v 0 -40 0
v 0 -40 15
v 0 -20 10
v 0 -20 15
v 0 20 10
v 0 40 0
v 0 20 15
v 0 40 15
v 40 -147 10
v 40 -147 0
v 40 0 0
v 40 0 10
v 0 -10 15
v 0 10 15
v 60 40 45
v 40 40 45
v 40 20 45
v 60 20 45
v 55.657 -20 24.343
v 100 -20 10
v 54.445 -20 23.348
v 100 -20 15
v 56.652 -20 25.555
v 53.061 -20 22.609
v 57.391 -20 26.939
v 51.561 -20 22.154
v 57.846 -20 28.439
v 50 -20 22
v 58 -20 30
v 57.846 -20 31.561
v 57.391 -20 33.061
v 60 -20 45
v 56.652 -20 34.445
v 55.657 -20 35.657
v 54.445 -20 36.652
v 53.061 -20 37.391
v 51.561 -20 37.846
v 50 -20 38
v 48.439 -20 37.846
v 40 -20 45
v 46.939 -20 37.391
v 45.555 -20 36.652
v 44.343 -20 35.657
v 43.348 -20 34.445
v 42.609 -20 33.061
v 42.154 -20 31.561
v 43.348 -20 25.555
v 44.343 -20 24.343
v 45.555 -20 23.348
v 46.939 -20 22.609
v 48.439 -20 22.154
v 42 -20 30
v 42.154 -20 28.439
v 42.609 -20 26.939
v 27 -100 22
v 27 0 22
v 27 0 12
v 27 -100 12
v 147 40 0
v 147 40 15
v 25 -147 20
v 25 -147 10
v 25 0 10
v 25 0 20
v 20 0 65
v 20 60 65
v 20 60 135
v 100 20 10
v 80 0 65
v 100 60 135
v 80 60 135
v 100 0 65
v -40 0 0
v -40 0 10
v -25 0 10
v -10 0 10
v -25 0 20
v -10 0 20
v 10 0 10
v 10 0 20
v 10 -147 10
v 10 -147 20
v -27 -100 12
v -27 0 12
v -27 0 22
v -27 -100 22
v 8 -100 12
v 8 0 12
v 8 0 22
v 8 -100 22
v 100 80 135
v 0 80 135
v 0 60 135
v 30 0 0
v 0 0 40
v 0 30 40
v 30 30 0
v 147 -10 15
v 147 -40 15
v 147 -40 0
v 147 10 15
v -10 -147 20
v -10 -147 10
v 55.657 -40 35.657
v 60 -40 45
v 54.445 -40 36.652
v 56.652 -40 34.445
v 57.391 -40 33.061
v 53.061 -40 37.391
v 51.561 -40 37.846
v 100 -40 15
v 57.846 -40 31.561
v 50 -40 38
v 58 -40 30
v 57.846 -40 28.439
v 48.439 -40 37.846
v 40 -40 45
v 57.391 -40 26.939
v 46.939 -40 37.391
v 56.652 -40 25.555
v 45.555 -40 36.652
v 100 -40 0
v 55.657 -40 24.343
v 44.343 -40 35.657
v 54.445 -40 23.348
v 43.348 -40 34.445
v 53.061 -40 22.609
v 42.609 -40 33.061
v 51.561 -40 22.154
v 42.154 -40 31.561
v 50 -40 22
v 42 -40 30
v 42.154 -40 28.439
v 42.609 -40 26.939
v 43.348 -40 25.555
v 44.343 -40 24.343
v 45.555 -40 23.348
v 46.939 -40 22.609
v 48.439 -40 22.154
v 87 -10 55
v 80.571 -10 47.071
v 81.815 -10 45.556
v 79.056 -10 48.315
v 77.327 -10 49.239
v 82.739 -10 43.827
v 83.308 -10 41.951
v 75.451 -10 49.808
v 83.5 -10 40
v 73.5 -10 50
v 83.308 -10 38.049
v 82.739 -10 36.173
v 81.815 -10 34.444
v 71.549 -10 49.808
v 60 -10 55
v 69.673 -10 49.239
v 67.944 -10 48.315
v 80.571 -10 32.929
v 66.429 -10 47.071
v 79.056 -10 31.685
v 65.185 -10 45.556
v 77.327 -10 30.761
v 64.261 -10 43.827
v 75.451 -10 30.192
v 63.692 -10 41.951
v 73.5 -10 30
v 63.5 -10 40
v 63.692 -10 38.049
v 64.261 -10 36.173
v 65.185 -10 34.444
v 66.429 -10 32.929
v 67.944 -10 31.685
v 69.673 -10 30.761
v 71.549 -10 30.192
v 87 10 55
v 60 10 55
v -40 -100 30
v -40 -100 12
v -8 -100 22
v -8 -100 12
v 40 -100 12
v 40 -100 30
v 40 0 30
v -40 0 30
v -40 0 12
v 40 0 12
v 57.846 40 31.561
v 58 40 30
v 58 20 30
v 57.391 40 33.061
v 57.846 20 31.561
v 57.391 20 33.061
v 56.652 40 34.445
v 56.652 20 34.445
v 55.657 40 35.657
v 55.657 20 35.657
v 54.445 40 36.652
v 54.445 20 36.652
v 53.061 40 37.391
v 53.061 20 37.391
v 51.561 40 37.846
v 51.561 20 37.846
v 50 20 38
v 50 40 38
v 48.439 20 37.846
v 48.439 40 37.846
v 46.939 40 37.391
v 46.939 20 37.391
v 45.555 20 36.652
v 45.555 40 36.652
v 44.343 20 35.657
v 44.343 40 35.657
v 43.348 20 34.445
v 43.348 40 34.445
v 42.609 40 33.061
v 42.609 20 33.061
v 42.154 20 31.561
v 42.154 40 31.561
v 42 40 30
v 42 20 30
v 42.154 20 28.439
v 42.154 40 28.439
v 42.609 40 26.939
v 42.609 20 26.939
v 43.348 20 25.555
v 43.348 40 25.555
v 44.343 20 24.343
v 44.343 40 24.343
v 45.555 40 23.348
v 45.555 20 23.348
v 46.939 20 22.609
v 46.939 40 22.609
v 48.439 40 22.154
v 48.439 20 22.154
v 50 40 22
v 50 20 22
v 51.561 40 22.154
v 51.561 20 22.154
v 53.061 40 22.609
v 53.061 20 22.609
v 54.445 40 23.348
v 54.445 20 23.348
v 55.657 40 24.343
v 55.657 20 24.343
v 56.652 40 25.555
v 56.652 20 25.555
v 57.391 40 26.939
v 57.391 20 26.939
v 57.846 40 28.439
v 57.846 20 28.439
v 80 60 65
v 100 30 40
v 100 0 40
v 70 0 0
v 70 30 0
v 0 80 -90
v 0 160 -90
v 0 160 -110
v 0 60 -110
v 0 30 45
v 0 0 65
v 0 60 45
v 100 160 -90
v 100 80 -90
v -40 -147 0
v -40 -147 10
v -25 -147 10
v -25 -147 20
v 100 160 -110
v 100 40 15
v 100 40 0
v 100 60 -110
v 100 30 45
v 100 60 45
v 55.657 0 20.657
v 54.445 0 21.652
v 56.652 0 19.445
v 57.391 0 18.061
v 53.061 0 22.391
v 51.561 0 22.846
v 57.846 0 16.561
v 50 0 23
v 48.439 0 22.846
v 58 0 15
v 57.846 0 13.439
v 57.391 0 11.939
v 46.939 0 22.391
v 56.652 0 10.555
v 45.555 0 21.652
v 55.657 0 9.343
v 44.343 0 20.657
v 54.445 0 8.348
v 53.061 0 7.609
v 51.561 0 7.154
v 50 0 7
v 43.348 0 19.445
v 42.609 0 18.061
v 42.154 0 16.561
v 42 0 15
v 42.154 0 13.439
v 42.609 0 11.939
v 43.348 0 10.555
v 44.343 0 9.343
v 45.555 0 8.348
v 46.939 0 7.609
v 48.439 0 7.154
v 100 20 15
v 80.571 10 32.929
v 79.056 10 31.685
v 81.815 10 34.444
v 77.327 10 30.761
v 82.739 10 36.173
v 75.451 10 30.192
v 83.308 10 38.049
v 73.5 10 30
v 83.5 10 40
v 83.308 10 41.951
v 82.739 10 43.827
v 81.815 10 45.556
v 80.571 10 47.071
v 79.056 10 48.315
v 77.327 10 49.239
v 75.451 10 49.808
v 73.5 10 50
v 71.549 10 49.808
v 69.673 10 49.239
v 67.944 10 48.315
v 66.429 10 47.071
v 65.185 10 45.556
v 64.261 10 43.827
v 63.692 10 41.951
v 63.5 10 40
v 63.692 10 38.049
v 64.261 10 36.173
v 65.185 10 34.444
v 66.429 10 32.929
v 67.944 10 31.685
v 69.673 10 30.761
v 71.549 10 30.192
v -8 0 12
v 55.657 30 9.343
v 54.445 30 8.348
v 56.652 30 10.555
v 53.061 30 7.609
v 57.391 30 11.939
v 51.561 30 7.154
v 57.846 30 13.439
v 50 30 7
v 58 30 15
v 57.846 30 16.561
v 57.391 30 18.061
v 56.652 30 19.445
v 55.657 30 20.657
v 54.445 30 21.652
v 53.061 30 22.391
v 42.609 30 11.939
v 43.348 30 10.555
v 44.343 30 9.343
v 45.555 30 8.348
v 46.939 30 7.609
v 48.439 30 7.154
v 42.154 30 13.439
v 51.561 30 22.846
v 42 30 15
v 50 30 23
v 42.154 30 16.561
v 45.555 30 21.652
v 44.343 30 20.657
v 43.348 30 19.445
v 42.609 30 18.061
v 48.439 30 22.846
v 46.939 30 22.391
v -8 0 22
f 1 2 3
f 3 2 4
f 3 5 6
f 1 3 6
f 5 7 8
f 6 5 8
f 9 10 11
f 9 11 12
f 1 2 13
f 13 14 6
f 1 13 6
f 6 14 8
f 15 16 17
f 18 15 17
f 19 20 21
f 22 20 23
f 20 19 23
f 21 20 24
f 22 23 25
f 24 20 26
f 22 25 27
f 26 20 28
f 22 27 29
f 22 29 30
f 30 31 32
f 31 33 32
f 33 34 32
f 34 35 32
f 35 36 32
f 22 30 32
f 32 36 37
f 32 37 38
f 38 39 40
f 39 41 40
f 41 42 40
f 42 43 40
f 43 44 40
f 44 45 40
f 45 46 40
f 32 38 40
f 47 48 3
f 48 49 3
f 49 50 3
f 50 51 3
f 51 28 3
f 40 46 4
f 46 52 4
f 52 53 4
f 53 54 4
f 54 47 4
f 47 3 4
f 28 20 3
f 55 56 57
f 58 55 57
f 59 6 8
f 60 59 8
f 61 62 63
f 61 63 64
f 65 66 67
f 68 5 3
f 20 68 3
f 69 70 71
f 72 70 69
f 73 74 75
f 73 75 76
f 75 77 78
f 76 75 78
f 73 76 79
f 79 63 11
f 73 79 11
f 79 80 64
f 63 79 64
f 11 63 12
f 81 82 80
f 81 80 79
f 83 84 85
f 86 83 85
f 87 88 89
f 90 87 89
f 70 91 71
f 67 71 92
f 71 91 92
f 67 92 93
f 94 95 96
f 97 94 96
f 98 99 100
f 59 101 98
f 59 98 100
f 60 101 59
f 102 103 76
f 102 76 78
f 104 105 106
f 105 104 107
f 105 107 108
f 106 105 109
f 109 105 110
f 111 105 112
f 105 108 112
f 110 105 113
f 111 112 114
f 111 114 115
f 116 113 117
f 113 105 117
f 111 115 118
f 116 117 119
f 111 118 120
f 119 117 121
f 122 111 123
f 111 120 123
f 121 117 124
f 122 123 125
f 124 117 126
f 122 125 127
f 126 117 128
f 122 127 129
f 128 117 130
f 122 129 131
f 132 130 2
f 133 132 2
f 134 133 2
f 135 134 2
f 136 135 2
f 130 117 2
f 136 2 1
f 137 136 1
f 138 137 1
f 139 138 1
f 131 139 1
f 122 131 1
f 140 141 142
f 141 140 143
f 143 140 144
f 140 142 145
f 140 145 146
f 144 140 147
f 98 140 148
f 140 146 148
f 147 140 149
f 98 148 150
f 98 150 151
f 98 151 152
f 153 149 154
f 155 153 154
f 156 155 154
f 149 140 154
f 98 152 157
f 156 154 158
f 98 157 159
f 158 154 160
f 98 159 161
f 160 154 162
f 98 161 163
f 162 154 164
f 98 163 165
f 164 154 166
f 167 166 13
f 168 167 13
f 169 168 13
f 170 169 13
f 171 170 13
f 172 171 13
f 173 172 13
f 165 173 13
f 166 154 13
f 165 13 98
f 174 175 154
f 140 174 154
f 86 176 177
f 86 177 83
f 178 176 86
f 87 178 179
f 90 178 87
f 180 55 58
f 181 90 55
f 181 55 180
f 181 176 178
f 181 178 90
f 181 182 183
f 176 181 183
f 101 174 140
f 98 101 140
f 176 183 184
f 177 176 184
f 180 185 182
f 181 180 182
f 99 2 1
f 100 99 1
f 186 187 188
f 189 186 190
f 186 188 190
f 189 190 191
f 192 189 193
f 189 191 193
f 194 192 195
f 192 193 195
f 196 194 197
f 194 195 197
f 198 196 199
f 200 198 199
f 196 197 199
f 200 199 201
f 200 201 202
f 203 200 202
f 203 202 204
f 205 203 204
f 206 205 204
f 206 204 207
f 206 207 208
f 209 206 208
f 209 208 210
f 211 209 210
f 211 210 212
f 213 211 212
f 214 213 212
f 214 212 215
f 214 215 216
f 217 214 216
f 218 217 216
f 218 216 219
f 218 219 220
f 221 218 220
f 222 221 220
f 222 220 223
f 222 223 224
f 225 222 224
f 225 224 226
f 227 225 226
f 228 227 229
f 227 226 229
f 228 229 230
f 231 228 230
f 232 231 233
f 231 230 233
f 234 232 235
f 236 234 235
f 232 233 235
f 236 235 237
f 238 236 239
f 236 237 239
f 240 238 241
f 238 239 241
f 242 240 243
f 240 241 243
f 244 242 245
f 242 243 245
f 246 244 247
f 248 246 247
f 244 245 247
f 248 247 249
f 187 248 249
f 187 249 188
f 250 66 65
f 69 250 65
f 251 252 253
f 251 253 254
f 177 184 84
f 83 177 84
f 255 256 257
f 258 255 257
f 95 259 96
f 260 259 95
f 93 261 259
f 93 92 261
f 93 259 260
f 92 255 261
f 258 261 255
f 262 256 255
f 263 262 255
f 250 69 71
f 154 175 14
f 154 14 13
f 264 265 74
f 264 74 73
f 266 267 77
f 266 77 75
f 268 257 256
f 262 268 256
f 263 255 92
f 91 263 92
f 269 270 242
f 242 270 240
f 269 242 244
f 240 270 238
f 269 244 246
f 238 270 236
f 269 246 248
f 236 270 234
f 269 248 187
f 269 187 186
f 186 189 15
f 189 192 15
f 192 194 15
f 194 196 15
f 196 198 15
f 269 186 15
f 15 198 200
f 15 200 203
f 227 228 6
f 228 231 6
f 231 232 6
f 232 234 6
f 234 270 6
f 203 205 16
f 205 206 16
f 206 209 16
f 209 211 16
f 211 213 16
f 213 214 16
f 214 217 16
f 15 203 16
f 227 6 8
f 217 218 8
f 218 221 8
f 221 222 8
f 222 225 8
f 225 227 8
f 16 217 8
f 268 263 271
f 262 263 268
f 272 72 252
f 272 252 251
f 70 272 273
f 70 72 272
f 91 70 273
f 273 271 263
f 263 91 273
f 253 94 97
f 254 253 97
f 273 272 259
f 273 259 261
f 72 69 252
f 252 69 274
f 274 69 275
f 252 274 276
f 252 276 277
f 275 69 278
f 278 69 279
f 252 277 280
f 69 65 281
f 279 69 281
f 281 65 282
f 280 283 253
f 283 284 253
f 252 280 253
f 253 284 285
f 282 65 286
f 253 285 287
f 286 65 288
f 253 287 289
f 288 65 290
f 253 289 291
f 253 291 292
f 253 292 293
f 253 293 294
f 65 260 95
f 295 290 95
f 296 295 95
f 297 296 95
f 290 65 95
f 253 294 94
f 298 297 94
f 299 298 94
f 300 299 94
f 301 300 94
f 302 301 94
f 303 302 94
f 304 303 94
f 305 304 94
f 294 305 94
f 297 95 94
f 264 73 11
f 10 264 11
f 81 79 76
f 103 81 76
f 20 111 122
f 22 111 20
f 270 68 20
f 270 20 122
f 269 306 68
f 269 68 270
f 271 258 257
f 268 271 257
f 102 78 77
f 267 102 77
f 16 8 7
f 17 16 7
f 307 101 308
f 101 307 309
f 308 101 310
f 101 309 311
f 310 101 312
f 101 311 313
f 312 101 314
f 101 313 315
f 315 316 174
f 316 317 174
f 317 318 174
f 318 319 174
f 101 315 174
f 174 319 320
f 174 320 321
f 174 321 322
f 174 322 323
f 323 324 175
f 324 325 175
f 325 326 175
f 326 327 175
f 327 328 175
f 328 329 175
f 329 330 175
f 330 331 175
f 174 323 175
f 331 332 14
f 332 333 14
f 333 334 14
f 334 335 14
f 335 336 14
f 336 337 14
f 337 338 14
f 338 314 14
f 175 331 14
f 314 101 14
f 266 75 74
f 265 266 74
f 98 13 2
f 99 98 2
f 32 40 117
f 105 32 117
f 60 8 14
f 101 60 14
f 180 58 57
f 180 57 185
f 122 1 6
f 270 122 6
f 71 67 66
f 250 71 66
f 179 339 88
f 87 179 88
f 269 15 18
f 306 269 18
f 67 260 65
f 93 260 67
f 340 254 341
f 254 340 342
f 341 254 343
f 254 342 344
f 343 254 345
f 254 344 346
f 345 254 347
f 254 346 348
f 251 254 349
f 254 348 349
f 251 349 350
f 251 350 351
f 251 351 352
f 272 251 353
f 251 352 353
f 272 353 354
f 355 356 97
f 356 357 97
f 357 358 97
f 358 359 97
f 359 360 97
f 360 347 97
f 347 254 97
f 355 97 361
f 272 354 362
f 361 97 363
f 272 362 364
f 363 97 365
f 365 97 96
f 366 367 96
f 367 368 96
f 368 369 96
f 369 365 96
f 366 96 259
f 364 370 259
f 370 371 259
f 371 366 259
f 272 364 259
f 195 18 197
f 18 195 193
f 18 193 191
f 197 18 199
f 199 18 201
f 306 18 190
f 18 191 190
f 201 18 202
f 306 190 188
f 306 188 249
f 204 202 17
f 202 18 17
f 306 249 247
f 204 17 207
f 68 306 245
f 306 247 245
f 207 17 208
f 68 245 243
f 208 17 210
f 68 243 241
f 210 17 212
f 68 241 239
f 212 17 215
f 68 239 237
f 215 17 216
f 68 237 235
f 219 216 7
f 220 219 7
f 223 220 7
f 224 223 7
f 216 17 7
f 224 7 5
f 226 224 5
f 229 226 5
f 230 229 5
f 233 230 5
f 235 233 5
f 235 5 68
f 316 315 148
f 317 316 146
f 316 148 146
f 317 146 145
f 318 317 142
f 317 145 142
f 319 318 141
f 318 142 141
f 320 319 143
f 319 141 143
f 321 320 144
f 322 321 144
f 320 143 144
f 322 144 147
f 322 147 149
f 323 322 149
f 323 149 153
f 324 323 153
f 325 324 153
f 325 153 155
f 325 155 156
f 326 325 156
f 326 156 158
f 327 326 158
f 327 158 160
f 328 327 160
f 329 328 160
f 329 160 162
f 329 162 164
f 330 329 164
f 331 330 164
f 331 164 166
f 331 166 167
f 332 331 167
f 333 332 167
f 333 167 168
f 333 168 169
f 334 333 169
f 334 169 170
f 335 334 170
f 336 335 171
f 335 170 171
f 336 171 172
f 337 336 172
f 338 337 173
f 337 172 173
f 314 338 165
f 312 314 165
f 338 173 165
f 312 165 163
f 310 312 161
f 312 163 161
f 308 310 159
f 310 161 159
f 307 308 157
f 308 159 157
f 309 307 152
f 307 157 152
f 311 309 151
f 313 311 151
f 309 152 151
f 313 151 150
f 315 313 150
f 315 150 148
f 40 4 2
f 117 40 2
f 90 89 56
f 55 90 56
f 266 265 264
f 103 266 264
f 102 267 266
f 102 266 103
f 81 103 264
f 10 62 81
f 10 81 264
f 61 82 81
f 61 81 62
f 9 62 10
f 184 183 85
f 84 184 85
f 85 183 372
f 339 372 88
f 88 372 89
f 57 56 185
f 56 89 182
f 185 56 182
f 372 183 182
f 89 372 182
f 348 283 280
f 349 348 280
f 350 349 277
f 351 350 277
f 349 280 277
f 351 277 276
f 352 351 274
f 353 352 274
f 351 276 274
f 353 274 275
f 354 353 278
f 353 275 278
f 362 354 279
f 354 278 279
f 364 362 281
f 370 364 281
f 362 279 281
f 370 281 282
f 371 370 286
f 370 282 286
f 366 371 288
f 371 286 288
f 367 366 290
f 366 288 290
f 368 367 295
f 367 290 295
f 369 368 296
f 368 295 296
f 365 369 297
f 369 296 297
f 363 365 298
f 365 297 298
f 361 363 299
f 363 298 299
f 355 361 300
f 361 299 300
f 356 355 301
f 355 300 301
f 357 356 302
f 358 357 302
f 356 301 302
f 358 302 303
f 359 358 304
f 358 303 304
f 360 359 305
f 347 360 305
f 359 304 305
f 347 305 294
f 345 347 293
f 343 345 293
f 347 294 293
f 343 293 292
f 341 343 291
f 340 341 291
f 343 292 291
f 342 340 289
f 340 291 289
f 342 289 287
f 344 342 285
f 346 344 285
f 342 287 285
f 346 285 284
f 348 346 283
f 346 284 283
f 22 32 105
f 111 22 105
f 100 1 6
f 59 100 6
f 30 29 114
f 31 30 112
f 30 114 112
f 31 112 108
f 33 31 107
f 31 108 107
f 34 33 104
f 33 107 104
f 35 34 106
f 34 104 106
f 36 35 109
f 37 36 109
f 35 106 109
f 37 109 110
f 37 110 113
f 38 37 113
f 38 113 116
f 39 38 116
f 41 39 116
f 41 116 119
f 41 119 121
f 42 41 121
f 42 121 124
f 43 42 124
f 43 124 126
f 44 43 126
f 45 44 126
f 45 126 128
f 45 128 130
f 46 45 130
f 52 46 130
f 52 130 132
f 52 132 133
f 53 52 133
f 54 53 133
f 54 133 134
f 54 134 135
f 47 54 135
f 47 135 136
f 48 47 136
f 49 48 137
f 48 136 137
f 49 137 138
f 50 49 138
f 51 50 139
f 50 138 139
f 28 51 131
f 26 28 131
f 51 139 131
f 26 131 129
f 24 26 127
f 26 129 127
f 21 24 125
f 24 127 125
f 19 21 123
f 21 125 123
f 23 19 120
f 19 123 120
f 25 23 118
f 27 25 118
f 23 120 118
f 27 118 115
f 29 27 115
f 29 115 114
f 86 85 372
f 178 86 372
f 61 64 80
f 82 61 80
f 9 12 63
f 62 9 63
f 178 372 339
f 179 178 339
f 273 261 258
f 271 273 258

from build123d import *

# Parameters (mm, degrees)
F1_DEPTH    = 147
F2_SIZE2    = 60
F2_SIZE     = 40
F2_2_SIZE2  = 60
F2_2_SIZE   = 40
F3_R        = 10
F4_DEPTH    = 50.001
F6_DEPTH    = 147
F7_DEPTH    = 100
F9_DEPTH    = 100
F10_R       = 8
F11_DEPTH   = 80.001
F12_SIZE2   = 40
F12_SIZE    = 30
F13_SIZE2   = 30
F13_SIZE    = 40
F13_2_SIZE2 = 30
F13_2_SIZE  = 40
F15_DEPTH   = 100
F16_R       = 8
F17_DEPTH   = 30
F18_SIZE2   = 30
F18_SIZE    = 40
F19_SIZE2   = 40
F19_SIZE    = 30
F21_DEPTH   = 20
F23_DEPTH   = 20


with BuildPart() as f1:
    # F0 (on Right) → F1 (new body)
    with BuildSketch(Plane.YZ):
        Polygon((-40, 0), (0, 0), (40, 0), (40, 15), (10, 15), (10, 55), (-10, 55), (-10, 15), (-40, 15), align=None)
    extrude(amount=F1_DEPTH)

    # F2
    f2_edges = [f1.edges().sort_by_distance(p)[0] for p in [
        (147, 0, 55),
    ]]
    f2_side = f1.faces().sort_by_distance((147, 0, 18.5))[0]
    chamfer(f2_edges, length=F2_SIZE, length2=F2_SIZE2, reference=f2_side)

    # F2#2
    f2_2_edges = [f1.edges().sort_by_distance(p)[0] for p in [
        (0, 0, 55),
    ]]
    f2_2_side = f1.faces().sort_by_distance((0, 0, 18.5))[0]
    chamfer(f2_2_edges, length=F2_2_SIZE, length2=F2_2_SIZE2, reference=f2_2_side)

    # F3 (on face) → F4 (cut, through all)
    with BuildSketch(Plane.XZ.offset(10)):
        with Locations((73.5, 40)):
            Circle(F3_R)
    extrude(amount=-F4_DEPTH, mode=Mode.SUBTRACT)


with BuildPart() as f6:
    # F5 (on Front) → F6 (new body)
    with BuildSketch(Plane.XZ):
        Polygon((-40, 0), (0, 0), (40, 0), (40, 10), (25, 10), (25, 20), (10, 20), (10, 10), (-10, 10), (-10, 20), (-25, 20), (-25, 10), (-40, 10), align=None)
    extrude(amount=F6_DEPTH)


with BuildPart() as f7:
    # F5 (on Front) → F7 (new body)
    with BuildSketch(Plane.XZ):
        Polygon((-40, 30), (-40, 12), (-27, 12), (-27, 22), (-8, 22), (-8, 12), (8, 12), (8, 22), (27, 22), (27, 12), (40, 12), (40, 30), align=None)
    extrude(amount=F7_DEPTH)


with BuildPart() as f9:
    # F8 (on Right) → F9 (new body)
    with BuildSketch(Plane.YZ):
        Polygon((-40, 0), (0, 0), (40, 0), (40, 45), (20, 45), (20, 10), (-20, 10), (-20, 45), (-40, 45), align=None)
    extrude(amount=F9_DEPTH)

    # F10 (on face) → F11 (cut, through all)
    with BuildSketch(Plane.XZ.offset(40)):
        with Locations((50, 30)):
            Circle(F10_R)
    extrude(amount=-F11_DEPTH, mode=Mode.SUBTRACT)

    # F12
    f12_edges = [f9.edges().sort_by_distance(p)[0] for p in [
        (100, -30, 45),
        (100, 30, 45),
    ]]
    f12_side = f9.faces().sort_by_distance((100, 0, 0.917878))[0]
    chamfer(f12_edges, length=F12_SIZE, length2=F12_SIZE2, reference=f12_side)

    # F13
    f13_edges = [f9.edges().sort_by_distance(p)[0] for p in [
        (0, 30, 45),
    ]]
    f13_side = f9.faces().sort_by_distance((30, 30, 45))[0]
    chamfer(f13_edges, length=F13_SIZE, length2=F13_SIZE2, reference=f13_side)

    # F13#2
    f13_2_edges = [f9.edges().sort_by_distance(p)[0] for p in [
        (0, -30, 45),
    ]]
    f13_2_side = f9.faces().sort_by_distance((30, -30, 45))[0]
    chamfer(f13_2_edges, length=F13_2_SIZE, length2=F13_2_SIZE2, reference=f13_2_side)


with BuildPart() as f15:
    # F14 (on Right) → F15 (new body)
    with BuildSketch(Plane.YZ):
        Polygon((0, 65), (0, 0), (30, 0), (30, 45), (60, 45), (60, -110), (160, -110), (160, -90), (80, -90), (80, 135), (60, 135), (60, 65), align=None)
    extrude(amount=F15_DEPTH)

    # F16 (on face) → F17 (cut, through all)
    with BuildSketch(Plane.XZ):
        with Locations((50, 15)):
            Circle(F16_R)
    extrude(amount=-F17_DEPTH, mode=Mode.SUBTRACT)

    # F18
    f18_edges = [f15.edges().sort_by_distance(p)[0] for p in [
        (100, 15, 0),
    ]]
    f18_side = f15.faces().sort_by_distance((100, 65.331492, -0.262431))[0]
    chamfer(f18_edges, length=F18_SIZE, length2=F18_SIZE2, reference=f18_side)

    # F19
    f19_edges = [f15.edges().sort_by_distance(p)[0] for p in [
        (0, 15, 0),
    ]]
    f19_side = f15.faces().sort_by_distance((35, 15, 0))[0]
    chamfer(f19_edges, length=F19_SIZE, length2=F19_SIZE2, reference=f19_side)

    # F20 (on face) → F21 (join)
    with BuildSketch(Plane.YZ.offset(100)):
        Polygon((60, 135), (0, 65), (60, 65), align=None)
    extrude(amount=-F21_DEPTH)

    # F22 (on face) → F23 (join)
    with BuildSketch(Plane(origin=(0, 0, 0), x_dir=(0, -1, 0), z_dir=(-1, 0, 0))):
        Polygon((0, 65), (-60, 135), (-60, 65), align=None)
    extrude(amount=-F23_DEPTH)


solid = Compound([f1.part, f6.part, f7.part, f9.part, f15.part])
